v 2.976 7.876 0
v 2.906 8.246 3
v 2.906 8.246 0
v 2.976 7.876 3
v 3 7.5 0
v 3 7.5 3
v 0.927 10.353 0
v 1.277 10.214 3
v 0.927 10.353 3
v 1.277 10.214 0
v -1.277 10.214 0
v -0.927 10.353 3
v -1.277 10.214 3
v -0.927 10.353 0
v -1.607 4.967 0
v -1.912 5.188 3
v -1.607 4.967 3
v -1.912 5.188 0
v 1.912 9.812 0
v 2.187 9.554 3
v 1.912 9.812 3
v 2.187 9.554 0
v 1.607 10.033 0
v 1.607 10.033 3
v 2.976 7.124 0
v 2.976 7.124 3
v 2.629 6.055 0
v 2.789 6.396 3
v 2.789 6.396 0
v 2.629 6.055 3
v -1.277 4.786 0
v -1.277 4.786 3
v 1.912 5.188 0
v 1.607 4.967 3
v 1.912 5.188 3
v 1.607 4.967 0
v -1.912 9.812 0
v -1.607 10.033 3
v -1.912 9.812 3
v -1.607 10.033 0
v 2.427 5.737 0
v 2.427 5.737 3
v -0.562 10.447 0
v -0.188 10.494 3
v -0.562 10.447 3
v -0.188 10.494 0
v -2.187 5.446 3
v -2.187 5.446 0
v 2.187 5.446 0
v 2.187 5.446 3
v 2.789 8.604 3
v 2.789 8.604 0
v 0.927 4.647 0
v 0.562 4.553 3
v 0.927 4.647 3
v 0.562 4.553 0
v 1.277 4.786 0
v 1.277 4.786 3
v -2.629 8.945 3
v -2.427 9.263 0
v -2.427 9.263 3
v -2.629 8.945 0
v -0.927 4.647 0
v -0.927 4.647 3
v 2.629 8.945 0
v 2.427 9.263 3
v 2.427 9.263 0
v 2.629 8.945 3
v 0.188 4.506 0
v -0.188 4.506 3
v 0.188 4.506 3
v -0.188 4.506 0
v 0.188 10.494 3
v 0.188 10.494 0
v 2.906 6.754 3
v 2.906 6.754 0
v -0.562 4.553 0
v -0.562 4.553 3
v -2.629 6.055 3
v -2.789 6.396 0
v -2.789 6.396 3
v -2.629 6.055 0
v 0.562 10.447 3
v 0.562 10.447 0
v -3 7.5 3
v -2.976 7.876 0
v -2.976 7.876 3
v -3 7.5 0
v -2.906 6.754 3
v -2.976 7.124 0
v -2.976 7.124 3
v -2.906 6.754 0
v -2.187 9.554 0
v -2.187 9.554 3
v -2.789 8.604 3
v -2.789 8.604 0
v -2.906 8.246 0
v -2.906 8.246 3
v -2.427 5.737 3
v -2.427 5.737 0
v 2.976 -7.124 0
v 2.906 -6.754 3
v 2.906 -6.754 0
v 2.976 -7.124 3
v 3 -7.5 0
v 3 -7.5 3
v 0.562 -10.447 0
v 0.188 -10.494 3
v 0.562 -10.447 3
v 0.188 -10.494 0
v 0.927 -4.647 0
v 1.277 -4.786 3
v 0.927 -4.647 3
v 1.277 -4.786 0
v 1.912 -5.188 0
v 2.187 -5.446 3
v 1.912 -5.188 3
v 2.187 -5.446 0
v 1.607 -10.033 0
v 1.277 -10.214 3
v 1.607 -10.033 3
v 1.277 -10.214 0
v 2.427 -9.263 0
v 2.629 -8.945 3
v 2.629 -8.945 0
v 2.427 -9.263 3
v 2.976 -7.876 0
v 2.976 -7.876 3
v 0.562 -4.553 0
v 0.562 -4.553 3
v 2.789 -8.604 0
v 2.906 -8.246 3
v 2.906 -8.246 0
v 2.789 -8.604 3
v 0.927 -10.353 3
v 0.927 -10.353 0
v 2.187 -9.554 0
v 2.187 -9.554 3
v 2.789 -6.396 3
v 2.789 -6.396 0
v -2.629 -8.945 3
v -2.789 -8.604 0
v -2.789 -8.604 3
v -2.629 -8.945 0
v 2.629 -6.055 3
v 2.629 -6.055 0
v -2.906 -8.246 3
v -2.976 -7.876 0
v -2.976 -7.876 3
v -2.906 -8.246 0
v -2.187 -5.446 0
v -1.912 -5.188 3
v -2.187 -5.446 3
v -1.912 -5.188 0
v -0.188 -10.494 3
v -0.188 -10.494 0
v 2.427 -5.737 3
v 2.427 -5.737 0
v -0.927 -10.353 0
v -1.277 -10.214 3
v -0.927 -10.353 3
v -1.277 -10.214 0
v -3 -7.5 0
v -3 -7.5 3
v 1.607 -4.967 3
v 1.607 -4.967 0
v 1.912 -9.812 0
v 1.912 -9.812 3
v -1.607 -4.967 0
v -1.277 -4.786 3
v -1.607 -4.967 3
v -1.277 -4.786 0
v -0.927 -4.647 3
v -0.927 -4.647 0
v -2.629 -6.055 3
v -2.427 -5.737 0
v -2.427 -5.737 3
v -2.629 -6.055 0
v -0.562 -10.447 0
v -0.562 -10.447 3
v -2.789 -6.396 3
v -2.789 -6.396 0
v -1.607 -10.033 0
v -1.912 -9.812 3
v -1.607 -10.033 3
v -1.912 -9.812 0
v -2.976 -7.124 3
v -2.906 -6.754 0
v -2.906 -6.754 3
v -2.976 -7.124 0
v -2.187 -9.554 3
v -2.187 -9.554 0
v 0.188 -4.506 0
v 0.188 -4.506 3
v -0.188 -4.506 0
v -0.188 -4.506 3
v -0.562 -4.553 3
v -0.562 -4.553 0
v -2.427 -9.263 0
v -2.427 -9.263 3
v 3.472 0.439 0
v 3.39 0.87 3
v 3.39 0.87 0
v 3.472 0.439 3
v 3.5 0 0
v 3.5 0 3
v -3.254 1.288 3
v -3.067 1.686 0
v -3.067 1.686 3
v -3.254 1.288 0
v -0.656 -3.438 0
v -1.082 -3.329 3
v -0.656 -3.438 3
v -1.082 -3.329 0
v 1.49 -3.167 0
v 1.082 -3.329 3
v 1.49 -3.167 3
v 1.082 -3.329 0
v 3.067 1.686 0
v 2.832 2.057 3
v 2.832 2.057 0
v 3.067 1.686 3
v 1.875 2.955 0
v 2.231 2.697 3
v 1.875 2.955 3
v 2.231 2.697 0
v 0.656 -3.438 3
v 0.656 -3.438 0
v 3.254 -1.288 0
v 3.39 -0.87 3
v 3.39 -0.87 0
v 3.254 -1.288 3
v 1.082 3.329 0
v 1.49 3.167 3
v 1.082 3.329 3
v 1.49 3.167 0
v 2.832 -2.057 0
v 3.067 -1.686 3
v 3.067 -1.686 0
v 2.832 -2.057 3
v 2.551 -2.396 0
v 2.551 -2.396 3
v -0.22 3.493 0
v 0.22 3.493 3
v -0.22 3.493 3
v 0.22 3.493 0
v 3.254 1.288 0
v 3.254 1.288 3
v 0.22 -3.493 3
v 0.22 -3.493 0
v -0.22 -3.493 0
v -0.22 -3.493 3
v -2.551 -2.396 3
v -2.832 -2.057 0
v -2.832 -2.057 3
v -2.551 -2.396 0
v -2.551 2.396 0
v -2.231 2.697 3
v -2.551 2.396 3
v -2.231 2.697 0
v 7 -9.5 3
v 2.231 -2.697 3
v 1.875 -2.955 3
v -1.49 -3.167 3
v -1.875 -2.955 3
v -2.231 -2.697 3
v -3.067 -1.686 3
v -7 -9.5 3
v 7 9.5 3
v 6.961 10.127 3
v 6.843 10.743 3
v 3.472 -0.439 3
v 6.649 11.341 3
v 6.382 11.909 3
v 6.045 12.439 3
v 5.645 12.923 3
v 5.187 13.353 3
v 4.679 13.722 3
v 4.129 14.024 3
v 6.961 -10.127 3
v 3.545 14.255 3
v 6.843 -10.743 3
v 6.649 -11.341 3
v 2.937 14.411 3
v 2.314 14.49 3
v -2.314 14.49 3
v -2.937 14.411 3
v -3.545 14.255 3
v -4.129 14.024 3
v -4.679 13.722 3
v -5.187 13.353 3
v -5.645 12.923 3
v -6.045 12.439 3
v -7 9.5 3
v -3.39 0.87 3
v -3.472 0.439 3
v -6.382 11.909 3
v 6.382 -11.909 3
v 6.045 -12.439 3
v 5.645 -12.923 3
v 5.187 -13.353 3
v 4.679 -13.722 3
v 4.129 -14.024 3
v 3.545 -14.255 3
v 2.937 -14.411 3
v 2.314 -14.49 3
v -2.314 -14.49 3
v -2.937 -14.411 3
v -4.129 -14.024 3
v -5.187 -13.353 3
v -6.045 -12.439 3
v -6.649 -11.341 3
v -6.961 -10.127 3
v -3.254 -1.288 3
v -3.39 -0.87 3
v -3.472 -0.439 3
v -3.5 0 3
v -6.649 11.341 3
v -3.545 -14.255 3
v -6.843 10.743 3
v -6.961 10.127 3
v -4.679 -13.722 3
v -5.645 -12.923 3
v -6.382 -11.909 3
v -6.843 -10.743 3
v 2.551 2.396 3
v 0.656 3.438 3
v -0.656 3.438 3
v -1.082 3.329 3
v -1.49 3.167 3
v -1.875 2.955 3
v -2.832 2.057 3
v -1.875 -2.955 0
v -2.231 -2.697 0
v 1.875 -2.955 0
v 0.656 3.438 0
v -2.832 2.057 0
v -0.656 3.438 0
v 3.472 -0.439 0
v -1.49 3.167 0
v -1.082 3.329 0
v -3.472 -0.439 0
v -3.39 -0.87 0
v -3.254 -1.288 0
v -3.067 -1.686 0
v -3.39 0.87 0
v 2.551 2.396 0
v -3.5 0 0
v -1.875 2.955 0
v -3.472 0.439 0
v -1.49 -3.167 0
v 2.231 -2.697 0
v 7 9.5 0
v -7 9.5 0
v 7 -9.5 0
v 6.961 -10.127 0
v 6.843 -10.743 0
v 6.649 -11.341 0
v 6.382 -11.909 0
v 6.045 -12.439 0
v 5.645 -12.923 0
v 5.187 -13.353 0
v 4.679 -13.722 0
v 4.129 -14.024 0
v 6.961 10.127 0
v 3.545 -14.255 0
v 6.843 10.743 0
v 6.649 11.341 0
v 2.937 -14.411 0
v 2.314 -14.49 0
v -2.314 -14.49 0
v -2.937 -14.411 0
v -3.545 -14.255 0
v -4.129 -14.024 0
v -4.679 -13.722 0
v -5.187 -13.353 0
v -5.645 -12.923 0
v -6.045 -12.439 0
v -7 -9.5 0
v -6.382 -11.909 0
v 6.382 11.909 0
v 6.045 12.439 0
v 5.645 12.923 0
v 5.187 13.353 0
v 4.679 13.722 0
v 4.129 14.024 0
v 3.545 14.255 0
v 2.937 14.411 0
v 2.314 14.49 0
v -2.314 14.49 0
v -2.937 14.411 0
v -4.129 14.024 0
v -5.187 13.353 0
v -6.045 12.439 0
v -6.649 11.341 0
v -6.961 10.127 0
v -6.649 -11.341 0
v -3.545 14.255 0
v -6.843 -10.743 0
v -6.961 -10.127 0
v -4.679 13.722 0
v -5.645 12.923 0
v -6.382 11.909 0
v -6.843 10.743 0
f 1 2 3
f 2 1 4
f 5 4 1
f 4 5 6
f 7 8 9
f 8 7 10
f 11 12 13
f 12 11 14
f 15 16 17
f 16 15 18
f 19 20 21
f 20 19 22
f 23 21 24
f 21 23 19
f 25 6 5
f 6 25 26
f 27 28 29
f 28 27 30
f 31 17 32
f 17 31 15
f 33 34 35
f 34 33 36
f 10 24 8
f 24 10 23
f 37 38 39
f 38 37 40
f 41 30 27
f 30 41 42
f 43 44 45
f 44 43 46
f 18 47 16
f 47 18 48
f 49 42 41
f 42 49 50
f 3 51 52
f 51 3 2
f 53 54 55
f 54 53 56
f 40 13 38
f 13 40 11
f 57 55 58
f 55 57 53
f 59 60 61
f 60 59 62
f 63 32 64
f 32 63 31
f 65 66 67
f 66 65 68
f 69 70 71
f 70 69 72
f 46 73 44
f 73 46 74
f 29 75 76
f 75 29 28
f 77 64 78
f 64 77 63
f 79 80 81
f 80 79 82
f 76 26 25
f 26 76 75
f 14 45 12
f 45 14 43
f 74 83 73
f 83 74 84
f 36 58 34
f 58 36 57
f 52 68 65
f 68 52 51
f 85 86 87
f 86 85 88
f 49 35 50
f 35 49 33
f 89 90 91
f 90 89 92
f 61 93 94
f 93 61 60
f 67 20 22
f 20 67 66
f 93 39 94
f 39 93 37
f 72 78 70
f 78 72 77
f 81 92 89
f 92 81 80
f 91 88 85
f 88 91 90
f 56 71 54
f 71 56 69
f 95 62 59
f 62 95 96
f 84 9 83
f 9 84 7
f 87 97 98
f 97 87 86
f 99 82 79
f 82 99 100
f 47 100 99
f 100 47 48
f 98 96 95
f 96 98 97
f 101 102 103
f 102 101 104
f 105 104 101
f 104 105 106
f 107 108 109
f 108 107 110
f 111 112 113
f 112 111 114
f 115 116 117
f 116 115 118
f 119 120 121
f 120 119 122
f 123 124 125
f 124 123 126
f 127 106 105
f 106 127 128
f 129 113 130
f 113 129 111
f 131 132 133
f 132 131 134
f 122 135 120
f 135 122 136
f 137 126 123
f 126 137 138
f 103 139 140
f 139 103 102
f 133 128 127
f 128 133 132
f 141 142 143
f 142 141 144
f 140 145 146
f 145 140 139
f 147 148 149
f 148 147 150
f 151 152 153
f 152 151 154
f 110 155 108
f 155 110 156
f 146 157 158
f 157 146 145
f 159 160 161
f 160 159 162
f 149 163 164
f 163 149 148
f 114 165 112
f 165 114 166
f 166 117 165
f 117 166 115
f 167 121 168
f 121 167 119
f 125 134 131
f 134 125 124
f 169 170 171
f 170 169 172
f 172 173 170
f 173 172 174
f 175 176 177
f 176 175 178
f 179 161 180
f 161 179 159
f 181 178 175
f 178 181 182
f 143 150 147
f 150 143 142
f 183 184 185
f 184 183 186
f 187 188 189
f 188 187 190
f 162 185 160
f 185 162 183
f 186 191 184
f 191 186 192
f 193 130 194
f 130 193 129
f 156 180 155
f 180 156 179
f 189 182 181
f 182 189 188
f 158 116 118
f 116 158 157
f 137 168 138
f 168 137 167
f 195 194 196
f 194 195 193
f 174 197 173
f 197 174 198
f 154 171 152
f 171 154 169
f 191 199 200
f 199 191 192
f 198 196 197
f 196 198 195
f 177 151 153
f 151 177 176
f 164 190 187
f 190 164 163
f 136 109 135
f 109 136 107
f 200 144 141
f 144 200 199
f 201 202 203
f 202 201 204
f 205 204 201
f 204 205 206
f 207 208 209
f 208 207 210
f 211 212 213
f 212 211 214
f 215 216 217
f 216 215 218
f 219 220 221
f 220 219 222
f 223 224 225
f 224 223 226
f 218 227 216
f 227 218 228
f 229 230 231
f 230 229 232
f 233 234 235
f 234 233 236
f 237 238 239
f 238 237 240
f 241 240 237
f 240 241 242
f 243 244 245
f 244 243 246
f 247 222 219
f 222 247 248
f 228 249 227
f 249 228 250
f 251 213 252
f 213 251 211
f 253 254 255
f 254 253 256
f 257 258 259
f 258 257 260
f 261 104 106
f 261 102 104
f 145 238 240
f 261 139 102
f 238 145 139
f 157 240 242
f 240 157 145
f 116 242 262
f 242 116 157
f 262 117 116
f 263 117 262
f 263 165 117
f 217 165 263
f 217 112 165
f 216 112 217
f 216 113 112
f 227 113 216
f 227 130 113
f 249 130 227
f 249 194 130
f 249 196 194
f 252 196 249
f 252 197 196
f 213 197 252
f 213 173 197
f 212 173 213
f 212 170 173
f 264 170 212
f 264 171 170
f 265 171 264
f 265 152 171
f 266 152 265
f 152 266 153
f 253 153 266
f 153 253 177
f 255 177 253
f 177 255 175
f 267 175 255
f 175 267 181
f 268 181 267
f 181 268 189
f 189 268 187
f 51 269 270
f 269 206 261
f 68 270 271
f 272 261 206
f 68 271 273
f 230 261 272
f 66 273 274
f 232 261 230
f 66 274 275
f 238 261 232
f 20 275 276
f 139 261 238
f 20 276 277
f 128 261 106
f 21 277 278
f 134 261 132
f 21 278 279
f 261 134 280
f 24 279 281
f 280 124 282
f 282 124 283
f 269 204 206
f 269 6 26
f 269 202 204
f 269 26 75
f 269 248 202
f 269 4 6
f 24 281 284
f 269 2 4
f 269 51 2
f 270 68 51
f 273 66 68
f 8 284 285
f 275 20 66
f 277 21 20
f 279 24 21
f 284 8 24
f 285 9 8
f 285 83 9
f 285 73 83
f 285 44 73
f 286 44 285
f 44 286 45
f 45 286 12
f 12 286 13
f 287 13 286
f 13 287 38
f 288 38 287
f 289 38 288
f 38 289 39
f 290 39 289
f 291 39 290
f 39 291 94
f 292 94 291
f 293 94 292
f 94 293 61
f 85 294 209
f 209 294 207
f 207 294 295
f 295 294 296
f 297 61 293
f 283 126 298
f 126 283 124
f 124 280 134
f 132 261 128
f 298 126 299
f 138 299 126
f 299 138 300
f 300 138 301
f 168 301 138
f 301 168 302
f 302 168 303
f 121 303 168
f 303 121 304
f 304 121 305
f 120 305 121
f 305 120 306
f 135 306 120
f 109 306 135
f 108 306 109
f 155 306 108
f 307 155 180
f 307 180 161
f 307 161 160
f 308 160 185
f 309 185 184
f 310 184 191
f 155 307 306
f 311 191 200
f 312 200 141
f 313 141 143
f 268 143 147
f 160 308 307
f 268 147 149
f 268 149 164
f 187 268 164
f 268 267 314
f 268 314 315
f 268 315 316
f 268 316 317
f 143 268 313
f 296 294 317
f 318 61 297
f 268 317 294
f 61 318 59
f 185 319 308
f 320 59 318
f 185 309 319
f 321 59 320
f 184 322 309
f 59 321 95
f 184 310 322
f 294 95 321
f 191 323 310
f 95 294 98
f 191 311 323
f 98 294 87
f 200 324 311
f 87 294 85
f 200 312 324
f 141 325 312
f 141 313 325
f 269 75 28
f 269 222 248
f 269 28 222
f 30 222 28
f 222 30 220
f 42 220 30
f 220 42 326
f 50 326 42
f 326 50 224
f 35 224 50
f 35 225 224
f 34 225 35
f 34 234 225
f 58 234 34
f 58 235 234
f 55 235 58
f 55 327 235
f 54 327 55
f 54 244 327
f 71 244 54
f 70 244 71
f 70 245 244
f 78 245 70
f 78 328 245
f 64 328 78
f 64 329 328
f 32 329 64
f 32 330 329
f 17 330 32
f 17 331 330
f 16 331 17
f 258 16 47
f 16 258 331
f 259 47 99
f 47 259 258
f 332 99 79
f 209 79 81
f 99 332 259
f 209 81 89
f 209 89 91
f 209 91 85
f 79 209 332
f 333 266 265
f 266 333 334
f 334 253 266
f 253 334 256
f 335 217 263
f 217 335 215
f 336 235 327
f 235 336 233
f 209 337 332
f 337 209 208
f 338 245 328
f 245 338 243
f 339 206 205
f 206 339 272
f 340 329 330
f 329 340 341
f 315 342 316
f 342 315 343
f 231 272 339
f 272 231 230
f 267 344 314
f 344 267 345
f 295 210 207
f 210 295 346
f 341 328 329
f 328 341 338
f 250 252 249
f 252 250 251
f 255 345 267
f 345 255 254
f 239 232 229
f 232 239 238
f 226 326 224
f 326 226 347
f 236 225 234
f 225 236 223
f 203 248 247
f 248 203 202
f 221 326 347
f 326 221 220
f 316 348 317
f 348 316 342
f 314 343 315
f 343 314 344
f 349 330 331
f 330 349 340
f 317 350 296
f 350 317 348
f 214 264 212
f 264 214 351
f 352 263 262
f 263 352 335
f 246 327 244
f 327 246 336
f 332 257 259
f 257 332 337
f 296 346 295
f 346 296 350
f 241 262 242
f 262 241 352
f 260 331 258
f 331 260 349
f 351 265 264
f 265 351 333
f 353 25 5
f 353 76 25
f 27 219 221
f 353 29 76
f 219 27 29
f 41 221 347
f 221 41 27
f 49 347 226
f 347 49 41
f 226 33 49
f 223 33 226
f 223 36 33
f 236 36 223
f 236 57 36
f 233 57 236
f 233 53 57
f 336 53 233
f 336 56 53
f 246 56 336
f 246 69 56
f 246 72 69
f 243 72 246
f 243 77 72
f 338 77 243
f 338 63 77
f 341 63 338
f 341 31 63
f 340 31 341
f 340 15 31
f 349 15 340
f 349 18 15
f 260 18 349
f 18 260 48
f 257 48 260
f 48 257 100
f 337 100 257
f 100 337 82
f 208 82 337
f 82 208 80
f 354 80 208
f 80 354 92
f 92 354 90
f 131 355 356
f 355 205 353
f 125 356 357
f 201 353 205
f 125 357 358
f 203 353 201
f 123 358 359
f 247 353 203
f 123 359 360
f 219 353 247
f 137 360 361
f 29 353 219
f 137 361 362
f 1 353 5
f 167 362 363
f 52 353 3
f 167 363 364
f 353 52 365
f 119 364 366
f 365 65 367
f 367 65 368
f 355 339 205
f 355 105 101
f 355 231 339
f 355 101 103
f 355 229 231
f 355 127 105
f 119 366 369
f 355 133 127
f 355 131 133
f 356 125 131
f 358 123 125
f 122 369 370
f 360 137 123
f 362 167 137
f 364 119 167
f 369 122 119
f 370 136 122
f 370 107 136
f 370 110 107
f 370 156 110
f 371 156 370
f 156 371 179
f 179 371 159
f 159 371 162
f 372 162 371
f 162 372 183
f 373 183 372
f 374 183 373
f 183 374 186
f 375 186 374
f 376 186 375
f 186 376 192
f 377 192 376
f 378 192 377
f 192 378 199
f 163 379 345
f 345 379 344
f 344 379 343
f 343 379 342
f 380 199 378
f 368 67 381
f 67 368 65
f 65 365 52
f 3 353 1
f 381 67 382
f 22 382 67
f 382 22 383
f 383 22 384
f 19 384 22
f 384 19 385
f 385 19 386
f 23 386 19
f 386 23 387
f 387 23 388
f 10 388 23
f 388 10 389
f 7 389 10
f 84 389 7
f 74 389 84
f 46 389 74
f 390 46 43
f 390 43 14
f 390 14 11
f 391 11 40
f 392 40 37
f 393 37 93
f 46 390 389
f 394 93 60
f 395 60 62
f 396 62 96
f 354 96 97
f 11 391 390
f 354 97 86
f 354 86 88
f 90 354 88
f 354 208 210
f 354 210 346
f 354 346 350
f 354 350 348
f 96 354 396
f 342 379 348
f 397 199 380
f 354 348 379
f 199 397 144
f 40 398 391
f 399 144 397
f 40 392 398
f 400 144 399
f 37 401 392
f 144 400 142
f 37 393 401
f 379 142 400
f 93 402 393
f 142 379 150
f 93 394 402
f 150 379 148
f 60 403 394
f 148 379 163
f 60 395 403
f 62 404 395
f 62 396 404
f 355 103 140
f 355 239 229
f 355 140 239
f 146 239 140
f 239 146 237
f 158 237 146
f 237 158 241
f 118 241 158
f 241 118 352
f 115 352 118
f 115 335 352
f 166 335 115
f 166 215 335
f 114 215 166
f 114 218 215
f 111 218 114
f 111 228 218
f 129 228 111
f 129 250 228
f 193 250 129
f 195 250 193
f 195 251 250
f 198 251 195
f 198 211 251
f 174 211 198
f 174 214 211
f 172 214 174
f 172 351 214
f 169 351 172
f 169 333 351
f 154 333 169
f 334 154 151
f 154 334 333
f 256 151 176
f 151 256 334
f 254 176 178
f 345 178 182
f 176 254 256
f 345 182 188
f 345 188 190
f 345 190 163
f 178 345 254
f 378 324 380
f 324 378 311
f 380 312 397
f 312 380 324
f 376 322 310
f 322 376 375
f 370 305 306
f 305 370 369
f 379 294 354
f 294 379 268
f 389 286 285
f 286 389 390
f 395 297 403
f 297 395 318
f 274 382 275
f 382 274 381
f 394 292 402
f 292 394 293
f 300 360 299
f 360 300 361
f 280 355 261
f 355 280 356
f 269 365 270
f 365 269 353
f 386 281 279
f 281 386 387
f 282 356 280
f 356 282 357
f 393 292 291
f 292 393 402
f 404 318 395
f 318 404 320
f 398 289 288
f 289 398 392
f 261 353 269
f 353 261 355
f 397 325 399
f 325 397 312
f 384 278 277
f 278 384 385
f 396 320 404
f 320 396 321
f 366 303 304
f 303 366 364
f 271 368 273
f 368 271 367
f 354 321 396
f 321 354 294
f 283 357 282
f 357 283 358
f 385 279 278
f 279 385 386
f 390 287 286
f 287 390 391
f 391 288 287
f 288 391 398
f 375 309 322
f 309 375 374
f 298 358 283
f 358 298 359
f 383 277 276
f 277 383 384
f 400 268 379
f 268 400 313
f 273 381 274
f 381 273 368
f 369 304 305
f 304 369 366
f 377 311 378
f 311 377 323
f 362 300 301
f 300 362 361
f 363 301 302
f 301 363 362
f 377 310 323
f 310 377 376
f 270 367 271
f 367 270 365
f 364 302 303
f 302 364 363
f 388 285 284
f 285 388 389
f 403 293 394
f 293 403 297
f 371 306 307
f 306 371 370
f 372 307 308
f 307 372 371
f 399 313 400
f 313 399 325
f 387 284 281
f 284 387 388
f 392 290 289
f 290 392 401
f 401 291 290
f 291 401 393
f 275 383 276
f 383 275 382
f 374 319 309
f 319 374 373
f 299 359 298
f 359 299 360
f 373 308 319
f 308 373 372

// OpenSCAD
$fn = 50;


difference() {
	union() {
		hull() {
			translate(v = [-2.0000000000, 9.5000000000, 0]) {
				cylinder(h = 3, r = 5);
			}
			translate(v = [2.0000000000, 9.5000000000, 0]) {
				cylinder(h = 3, r = 5);
			}
			translate(v = [-2.0000000000, -9.5000000000, 0]) {
				cylinder(h = 3, r = 5);
			}
			translate(v = [2.0000000000, -9.5000000000, 0]) {
				cylinder(h = 3, r = 5);
			}
		}
	}
	union() {
		#translate(v = [0.0000000000, 7.5000000000, 0]) {
			cylinder(h = 3, r = 3.0000000000);
		}
		#translate(v = [0.0000000000, -7.5000000000, 0]) {
			cylinder(h = 3, r = 3.0000000000);
		}
		#translate(v = [0.0000000000, -7.5000000000, -100.0000000000]) {
			cylinder(h = 200, r = 3.0000000000);
		}
		#translate(v = [0.0000000000, -7.5000000000, -100.0000000000]) {
			cylinder(h = 200, r = 3.0000000000);
		}
		#translate(v = [0.0000000000, 7.5000000000, -100.0000000000]) {
			cylinder(h = 200, r = 3.0000000000);
		}
		#translate(v = [0.0000000000, 7.5000000000, -100.0000000000]) {
			cylinder(h = 200, r = 3.0000000000);
		}
		#translate(v = [0.0000000000, 7.5000000000, 0]) {
			cylinder(h = 3, r = 1.5000000000);
		}
		#translate(v = [0.0000000000, -7.5000000000, 0]) {
			cylinder(h = 3, r = 1.5000000000);
		}
		#translate(v = [0.0000000000, 7.5000000000, 0]) {
			cylinder(h = 3, r = 1.5000000000);
		}
		#translate(v = [0.0000000000, -7.5000000000, 0]) {
			cylinder(h = 3, r = 1.5000000000);
		}
		#translate(v = [0.0000000000, 7.5000000000, 0]) {
			cylinder(h = 3, r = 1.5000000000);
		}
		#translate(v = [0.0000000000, -7.5000000000, 0]) {
			cylinder(h = 3, r = 1.5000000000);
		}
		#cylinder(h = 3, r = 3.5000000000);
	}
}
